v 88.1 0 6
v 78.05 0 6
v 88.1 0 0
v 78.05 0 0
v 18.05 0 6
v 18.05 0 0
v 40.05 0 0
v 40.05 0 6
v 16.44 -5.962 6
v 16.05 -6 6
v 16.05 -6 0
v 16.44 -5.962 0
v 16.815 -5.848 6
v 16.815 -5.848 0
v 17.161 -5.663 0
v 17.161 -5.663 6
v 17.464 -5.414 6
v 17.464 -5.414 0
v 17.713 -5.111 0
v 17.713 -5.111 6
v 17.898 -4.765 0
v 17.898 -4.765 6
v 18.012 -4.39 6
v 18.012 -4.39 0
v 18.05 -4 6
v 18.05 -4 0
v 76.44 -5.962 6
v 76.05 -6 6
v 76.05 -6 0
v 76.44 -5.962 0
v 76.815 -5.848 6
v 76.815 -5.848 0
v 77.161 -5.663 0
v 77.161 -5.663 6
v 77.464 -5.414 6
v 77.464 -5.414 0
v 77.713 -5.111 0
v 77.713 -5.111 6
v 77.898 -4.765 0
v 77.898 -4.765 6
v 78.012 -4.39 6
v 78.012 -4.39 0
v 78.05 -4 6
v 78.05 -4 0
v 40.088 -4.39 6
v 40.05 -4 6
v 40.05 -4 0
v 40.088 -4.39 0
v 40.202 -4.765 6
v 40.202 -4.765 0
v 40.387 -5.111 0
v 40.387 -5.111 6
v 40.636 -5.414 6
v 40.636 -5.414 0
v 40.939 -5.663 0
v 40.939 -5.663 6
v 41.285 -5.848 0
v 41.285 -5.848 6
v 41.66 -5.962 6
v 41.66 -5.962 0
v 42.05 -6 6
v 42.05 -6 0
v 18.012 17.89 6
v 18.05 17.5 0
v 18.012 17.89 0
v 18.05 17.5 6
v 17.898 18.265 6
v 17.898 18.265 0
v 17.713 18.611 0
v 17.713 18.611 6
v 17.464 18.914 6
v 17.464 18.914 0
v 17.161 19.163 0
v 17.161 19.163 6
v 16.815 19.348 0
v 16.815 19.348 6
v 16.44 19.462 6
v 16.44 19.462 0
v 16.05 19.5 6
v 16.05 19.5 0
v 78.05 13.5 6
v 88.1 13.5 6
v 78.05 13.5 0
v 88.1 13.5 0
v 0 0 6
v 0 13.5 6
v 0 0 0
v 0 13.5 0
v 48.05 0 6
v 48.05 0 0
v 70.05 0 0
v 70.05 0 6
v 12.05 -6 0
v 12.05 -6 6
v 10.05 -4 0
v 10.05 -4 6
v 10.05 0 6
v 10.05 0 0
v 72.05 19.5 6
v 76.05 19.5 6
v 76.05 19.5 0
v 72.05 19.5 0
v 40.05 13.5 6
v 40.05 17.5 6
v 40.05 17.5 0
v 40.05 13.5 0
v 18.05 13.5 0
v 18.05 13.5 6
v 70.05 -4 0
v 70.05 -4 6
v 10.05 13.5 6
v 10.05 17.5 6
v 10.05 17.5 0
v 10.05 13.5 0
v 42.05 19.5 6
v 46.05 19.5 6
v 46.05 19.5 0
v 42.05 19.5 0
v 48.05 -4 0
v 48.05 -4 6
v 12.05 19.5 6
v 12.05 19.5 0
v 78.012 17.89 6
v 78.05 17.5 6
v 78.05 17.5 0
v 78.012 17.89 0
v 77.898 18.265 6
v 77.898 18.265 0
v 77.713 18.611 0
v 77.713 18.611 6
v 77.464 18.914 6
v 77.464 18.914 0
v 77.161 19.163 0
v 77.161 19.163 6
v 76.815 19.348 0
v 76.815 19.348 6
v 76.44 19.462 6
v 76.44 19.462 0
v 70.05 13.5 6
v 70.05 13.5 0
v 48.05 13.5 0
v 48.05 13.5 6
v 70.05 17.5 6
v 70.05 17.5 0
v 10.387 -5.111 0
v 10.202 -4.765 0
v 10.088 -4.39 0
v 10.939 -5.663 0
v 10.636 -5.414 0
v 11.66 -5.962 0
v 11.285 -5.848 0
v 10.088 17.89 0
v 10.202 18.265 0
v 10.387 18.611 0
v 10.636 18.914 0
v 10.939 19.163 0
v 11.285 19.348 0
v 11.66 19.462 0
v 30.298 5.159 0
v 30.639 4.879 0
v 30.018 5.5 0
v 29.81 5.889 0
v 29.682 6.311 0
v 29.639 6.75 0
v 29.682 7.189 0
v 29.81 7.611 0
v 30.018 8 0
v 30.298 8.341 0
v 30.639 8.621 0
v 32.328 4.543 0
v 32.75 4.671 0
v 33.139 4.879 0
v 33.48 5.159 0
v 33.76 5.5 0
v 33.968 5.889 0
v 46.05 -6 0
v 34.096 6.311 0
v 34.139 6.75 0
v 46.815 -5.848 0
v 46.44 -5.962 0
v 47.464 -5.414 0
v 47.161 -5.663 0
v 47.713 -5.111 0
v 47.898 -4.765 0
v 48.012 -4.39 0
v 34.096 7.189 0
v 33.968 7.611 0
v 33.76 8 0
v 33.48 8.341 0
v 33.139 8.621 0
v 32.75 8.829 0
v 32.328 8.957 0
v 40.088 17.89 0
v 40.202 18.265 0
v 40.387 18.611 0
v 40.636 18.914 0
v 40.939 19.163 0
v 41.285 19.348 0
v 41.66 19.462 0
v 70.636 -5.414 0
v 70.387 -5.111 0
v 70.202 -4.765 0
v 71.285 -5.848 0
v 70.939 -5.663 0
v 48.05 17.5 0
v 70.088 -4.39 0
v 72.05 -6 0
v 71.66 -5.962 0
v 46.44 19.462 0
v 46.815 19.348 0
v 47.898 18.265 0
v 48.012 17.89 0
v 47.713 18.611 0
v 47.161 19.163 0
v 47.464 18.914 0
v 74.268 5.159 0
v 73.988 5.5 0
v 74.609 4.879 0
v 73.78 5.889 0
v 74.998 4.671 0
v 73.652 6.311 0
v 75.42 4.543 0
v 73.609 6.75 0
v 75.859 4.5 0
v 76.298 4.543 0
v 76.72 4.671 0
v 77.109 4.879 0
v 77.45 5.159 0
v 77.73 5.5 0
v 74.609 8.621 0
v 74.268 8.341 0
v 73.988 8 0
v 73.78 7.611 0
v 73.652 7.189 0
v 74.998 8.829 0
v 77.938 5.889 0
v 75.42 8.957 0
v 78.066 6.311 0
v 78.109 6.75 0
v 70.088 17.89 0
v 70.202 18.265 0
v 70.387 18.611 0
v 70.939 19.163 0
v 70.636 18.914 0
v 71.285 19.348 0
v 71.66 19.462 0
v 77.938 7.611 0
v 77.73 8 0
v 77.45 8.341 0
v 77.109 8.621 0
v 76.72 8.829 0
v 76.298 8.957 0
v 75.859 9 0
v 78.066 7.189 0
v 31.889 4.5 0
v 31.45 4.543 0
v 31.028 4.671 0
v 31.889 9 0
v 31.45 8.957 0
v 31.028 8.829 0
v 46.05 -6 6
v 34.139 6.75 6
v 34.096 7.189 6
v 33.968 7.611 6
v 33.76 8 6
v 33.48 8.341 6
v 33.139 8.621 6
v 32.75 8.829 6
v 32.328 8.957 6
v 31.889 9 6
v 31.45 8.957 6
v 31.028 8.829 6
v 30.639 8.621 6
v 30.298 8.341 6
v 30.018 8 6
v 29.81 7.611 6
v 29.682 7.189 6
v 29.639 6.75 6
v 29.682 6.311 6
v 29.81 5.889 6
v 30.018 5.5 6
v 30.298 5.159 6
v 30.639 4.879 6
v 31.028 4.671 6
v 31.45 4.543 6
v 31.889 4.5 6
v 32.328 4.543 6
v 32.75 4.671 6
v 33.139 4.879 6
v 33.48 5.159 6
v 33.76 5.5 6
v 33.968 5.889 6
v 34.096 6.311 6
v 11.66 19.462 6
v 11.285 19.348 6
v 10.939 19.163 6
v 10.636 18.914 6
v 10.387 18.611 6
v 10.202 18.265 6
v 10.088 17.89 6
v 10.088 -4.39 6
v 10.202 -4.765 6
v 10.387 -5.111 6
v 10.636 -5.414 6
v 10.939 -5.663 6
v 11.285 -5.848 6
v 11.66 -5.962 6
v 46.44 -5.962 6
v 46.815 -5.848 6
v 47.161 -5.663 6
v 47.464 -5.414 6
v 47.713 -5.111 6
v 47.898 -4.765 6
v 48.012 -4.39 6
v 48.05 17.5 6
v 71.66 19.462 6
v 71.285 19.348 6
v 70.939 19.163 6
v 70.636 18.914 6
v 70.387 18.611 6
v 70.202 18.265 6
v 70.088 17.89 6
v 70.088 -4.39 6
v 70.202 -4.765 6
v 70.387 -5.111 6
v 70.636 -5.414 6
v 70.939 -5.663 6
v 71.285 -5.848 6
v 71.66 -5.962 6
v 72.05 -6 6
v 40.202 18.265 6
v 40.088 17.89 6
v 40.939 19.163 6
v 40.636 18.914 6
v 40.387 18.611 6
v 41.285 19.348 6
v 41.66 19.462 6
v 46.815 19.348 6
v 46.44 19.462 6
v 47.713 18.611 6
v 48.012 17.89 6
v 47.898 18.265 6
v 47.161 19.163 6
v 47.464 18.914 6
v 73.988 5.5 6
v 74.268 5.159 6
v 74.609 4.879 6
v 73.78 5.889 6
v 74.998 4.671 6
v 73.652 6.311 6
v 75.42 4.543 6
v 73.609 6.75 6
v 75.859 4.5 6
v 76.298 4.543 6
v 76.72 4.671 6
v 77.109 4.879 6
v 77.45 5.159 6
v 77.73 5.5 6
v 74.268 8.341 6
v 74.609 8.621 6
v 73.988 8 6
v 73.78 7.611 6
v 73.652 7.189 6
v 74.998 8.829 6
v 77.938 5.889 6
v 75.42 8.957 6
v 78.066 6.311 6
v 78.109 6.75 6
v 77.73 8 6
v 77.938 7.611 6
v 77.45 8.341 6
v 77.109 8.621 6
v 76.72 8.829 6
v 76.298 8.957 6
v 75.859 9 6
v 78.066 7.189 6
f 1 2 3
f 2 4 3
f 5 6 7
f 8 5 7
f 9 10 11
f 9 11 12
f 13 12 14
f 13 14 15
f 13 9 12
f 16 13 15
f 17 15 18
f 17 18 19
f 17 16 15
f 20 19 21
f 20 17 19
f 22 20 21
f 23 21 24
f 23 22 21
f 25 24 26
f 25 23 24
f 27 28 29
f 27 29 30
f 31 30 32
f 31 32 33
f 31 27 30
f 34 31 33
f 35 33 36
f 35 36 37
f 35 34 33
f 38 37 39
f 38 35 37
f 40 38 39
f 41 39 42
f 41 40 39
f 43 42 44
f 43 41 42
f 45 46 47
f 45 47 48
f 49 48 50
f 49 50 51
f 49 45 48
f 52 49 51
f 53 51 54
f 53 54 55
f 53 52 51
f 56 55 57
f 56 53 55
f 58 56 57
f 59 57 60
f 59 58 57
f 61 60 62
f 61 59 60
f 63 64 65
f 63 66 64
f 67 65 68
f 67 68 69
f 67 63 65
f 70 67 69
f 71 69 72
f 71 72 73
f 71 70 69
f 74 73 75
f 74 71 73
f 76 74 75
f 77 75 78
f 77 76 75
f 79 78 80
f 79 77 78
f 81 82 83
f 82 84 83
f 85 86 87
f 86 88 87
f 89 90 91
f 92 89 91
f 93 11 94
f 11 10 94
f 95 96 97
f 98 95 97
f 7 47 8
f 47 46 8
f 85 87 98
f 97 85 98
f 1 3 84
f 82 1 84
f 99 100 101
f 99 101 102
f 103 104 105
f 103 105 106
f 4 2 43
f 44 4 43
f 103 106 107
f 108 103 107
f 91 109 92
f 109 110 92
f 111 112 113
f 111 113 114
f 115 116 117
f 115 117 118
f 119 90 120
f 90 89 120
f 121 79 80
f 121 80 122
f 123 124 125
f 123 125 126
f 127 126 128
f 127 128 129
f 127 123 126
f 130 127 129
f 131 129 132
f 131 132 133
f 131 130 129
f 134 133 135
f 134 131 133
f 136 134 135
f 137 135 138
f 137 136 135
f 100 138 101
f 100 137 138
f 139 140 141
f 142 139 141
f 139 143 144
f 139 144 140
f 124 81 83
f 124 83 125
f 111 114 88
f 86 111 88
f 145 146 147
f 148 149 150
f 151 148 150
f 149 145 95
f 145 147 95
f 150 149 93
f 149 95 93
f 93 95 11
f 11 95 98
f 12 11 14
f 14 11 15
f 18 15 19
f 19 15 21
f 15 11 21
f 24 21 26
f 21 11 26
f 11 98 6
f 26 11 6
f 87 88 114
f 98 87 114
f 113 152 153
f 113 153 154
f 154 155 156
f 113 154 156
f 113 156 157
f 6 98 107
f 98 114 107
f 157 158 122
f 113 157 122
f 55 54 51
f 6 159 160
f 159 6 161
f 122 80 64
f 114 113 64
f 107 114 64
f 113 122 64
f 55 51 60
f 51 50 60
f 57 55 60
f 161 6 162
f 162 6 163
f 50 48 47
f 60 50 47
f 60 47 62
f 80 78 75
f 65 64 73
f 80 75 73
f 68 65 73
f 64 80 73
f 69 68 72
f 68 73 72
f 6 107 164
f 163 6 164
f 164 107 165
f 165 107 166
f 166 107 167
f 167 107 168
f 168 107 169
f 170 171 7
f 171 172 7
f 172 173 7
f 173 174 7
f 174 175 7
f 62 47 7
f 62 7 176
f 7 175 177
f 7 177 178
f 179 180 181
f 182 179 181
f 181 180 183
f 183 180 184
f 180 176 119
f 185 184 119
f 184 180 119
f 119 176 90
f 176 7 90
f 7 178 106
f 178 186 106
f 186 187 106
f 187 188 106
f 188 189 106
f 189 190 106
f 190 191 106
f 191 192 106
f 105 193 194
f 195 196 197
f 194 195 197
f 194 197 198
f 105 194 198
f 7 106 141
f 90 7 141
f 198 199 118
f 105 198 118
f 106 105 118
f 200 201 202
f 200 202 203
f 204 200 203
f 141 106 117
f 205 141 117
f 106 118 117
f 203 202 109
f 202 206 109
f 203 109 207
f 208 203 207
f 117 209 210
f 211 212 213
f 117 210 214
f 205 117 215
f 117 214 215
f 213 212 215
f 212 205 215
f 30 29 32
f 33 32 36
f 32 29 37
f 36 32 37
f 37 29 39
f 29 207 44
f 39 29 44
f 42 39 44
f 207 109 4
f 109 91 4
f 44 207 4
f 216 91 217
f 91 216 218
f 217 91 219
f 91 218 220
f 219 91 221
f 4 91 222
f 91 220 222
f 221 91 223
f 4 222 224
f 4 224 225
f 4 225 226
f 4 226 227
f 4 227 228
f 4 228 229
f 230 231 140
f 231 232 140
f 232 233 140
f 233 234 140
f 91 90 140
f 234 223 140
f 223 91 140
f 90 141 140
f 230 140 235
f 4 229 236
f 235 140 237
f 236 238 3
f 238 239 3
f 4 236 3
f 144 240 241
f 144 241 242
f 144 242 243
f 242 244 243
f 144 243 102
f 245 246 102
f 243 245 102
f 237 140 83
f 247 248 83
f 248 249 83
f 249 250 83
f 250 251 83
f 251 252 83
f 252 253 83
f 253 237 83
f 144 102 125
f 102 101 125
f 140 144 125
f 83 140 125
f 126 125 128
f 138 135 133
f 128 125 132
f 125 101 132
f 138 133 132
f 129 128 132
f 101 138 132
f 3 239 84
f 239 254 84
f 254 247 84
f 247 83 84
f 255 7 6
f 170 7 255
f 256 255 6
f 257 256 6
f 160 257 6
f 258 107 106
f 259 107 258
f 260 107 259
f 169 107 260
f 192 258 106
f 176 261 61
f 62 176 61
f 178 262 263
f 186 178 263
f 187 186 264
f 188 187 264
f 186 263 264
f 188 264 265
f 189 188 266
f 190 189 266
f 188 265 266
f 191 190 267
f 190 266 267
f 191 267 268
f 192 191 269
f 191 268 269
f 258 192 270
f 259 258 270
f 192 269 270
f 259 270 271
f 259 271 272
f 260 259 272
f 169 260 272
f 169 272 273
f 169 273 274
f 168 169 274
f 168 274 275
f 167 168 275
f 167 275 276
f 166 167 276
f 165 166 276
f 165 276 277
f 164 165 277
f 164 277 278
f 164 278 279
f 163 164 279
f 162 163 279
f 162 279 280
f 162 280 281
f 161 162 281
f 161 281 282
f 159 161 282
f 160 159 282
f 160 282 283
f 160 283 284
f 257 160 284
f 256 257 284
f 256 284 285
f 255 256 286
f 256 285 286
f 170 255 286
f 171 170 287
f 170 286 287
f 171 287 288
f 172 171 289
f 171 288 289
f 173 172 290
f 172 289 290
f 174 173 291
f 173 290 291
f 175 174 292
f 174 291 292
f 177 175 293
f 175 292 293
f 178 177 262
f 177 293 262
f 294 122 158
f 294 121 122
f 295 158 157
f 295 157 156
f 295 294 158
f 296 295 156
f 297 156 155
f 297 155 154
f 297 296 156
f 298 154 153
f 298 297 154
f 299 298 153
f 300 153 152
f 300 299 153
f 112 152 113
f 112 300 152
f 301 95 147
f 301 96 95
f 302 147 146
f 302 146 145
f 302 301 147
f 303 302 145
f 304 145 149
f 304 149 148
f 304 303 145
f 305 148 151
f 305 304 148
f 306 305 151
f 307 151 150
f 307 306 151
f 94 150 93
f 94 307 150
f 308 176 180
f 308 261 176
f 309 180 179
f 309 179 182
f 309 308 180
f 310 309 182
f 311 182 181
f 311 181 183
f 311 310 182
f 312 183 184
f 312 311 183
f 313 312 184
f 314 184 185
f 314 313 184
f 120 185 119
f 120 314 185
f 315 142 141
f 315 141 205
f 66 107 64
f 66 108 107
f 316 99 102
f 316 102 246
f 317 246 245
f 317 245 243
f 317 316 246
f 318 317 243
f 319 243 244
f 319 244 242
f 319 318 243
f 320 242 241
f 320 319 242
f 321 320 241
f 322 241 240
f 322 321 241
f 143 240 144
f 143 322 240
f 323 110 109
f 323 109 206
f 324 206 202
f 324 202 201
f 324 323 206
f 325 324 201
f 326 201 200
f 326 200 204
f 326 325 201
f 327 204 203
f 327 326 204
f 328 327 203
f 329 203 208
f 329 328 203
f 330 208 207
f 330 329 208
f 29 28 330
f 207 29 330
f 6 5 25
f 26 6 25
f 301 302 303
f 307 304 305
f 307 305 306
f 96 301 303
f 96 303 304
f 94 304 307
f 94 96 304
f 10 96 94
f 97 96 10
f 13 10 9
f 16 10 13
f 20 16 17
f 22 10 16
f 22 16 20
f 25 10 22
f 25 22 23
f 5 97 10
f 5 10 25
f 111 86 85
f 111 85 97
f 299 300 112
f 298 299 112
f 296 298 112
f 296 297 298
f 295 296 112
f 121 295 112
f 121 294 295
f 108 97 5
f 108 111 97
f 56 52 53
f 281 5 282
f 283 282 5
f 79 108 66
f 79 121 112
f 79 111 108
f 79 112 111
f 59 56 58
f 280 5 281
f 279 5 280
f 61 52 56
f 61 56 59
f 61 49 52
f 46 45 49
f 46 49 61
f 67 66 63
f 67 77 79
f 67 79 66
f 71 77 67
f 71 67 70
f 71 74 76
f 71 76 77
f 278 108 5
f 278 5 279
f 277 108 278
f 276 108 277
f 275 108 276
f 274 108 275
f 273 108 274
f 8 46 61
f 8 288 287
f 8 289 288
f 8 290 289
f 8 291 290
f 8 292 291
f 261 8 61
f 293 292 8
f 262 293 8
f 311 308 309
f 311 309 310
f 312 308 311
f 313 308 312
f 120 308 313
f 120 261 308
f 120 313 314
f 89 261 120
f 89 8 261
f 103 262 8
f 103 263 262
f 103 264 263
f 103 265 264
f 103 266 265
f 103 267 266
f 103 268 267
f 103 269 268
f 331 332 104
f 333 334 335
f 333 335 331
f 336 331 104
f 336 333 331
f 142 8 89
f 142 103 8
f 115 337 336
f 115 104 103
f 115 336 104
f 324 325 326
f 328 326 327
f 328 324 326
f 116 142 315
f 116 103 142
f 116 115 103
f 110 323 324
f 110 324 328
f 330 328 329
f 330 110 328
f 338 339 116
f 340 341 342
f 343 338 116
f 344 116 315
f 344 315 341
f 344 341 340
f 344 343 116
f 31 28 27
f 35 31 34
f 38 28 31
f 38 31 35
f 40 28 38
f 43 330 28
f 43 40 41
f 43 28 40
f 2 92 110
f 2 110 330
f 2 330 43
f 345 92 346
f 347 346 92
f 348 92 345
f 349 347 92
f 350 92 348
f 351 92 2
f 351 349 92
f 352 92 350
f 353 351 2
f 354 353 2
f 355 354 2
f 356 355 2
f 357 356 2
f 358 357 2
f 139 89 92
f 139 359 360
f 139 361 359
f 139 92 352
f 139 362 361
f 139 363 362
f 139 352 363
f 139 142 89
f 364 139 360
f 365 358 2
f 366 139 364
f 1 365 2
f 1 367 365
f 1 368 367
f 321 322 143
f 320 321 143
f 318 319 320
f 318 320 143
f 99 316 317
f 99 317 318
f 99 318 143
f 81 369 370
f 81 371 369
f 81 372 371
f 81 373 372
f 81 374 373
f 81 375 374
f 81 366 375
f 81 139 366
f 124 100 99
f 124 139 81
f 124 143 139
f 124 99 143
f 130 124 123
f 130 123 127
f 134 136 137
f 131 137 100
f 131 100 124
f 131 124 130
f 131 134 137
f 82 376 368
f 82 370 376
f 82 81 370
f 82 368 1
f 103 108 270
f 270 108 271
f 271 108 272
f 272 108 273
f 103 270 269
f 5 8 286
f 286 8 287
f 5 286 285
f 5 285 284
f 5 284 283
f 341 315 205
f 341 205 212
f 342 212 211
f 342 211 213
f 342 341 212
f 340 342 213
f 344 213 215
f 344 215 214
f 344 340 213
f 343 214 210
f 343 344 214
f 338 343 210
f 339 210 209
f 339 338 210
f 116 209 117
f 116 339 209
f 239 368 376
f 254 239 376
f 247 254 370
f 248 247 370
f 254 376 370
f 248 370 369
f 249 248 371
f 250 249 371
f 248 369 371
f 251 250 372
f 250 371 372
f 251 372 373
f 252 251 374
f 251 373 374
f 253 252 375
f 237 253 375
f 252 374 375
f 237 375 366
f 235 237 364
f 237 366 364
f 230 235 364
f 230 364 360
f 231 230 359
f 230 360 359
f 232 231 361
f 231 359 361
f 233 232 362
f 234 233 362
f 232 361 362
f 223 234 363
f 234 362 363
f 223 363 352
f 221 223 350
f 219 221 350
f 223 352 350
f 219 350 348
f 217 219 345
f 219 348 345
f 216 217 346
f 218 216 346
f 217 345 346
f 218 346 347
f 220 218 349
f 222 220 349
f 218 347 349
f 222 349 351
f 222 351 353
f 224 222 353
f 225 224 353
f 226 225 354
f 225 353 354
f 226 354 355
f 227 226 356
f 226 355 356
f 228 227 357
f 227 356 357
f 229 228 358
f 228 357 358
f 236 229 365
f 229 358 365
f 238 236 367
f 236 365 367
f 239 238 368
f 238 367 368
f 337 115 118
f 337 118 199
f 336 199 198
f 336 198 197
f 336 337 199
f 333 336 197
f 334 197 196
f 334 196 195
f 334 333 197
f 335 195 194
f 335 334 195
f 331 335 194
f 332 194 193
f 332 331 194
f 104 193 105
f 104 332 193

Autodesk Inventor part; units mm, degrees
ref_plane "YZ Plane" through (0, 0, 0) normal (1, 0, 0) x (0, 1, 0)
ref_plane "XZ Plane" through (0, 0, 0) normal (0, 1, 0) x (-1, 0, 0)
ref_plane "XY Plane" through (0, 0, 0) normal (0, 0, 1) x (1, 0, 0)
sketch "Sketch1" plane through (0, 0, 0) normal (0, 0, 1) x (1, 0, 0)
  line L0 (0, 0) -> (88.1, 0)
  line L1 (88.1, 0) -> (88.1, 13.5)
  line L2 (88.1, 13.5) -> (0, 13.5)
  line L3 (0, 13.5) -> (0, 0)
  dimension "d0" = 88.1
  dimension "d1" = 13.5
extrude "Extrusion1" add sketch "Sketch1" along normal blind 6
sketch "Sketch2" plane through (0, 0, 6) normal (0, 0, 1) x (1, 0, 0)
  line L0 (0, 0) -> (88.1, 0) projected
  line L1 (88.1, 13.5) -> (0, 13.5) projected
  line L2 (40.05, 13.5) -> (48.05, 13.5)
  line L3 (48.05, 13.5) -> (48.05, 17.5)
  line L4 (46.05, 19.5) -> (42.05, 19.5)
  line L5 (40.05, 17.5) -> (40.05, 13.5)
  line L6 (70.05, 13.5) -> (78.05, 13.5)
  line L7 (78.05, 13.5) -> (78.05, 17.5)
  line L8 (76.05, 19.5) -> (72.05, 19.5)
  line L9 (70.05, 17.5) -> (70.05, 13.5)
  line L10 (10.05, 13.5) -> (18.05, 13.5)
  line L11 (18.05, 13.5) -> (18.05, 17.5)
  line L12 (16.05, 19.5) -> (12.05, 19.5)
  line L13 (10.05, 17.5) -> (10.05, 13.5)
  line L14 (10.05, 0) -> (18.05, 0)
  line L15 (18.05, 0) -> (18.05, -4)
  line L16 (16.05, -6) -> (12.05, -6)
  line L17 (10.05, -4) -> (10.05, 0)
  line L18 (40.05, 0) -> (48.05, 0)
  line L19 (48.05, 0) -> (48.05, -4)
  line L20 (46.05, -6) -> (42.05, -6)
  line L21 (40.05, -4) -> (40.05, 0)
  line L22 (70.05, 0) -> (78.05, 0)
  line L23 (78.05, 0) -> (78.05, -4)
  line L24 (76.05, -6) -> (72.05, -6)
  line L25 (70.05, -4) -> (70.05, 0)
  arc A0 (12.05, 19.5) -> (10.05, 17.5) centre (12.05, 17.5) ccw
  arc A1 (18.05, 17.5) -> (16.05, 19.5) centre (16.05, 17.5) ccw
  arc A2 (42.05, 19.5) -> (40.05, 17.5) centre (42.05, 17.5) ccw
  arc A3 (48.05, 17.5) -> (46.05, 19.5) centre (46.05, 17.5) ccw
  arc A4 (72.05, 19.5) -> (70.05, 17.5) centre (72.05, 17.5) ccw
  arc A5 (78.05, 17.5) -> (76.05, 19.5) centre (76.05, 17.5) ccw
  arc A6 (70.05, -4) -> (72.05, -6) centre (72.05, -4) ccw
  arc A7 (76.05, -6) -> (78.05, -4) centre (76.05, -4) ccw
  arc A8 (40.05, -4) -> (42.05, -6) centre (42.05, -4) ccw
  arc A9 (46.05, -6) -> (48.05, -4) centre (46.05, -4) ccw
  arc A10 (16.05, -6) -> (18.05, -4) centre (16.05, -4) ccw
  arc A11 (10.05, -4) -> (12.05, -6) centre (12.05, -4) ccw
  line L26 (88.1, 13.5) -> (0, 13.5) projected
  line L27 (18.05, 15.5) -> (40.05, 15.5) construction
  line L28 (48.05, 15.5) -> (70.05, 15.5) construction
  point P0 (44.05, 19.5)
  point P1 (44.05, 13.5)
  dimension "d4" = 2
  dimension "d5" = 8
  dimension "d6" = 8
  dimension "d7" = 8
  dimension "d8" = 6
  dimension "d9" = 6
  dimension "d10" = 22
extrude "Extrusion2" add sketch "Sketch2" against normal blind 6
sketch "Sketch3" plane through (0, 0, 6) normal (0, 0, 1) x (1, 0, 0)
  line L0 (0, 13.5) -> (0, 0) projected
  circle A0 centre (31.889, 6.75) radius 2.25
  circle A1 centre (75.859, 6.75) radius 2.25
  point P0 (0, 6.75)
  dimension "d13" = 31.889
  dimension "d14" = 75.859
  dimension "d15" = 4.5
extrude "Extrusion3" cut sketch "Sketch3" against normal through all
properties part number "rope_mount_holder"
